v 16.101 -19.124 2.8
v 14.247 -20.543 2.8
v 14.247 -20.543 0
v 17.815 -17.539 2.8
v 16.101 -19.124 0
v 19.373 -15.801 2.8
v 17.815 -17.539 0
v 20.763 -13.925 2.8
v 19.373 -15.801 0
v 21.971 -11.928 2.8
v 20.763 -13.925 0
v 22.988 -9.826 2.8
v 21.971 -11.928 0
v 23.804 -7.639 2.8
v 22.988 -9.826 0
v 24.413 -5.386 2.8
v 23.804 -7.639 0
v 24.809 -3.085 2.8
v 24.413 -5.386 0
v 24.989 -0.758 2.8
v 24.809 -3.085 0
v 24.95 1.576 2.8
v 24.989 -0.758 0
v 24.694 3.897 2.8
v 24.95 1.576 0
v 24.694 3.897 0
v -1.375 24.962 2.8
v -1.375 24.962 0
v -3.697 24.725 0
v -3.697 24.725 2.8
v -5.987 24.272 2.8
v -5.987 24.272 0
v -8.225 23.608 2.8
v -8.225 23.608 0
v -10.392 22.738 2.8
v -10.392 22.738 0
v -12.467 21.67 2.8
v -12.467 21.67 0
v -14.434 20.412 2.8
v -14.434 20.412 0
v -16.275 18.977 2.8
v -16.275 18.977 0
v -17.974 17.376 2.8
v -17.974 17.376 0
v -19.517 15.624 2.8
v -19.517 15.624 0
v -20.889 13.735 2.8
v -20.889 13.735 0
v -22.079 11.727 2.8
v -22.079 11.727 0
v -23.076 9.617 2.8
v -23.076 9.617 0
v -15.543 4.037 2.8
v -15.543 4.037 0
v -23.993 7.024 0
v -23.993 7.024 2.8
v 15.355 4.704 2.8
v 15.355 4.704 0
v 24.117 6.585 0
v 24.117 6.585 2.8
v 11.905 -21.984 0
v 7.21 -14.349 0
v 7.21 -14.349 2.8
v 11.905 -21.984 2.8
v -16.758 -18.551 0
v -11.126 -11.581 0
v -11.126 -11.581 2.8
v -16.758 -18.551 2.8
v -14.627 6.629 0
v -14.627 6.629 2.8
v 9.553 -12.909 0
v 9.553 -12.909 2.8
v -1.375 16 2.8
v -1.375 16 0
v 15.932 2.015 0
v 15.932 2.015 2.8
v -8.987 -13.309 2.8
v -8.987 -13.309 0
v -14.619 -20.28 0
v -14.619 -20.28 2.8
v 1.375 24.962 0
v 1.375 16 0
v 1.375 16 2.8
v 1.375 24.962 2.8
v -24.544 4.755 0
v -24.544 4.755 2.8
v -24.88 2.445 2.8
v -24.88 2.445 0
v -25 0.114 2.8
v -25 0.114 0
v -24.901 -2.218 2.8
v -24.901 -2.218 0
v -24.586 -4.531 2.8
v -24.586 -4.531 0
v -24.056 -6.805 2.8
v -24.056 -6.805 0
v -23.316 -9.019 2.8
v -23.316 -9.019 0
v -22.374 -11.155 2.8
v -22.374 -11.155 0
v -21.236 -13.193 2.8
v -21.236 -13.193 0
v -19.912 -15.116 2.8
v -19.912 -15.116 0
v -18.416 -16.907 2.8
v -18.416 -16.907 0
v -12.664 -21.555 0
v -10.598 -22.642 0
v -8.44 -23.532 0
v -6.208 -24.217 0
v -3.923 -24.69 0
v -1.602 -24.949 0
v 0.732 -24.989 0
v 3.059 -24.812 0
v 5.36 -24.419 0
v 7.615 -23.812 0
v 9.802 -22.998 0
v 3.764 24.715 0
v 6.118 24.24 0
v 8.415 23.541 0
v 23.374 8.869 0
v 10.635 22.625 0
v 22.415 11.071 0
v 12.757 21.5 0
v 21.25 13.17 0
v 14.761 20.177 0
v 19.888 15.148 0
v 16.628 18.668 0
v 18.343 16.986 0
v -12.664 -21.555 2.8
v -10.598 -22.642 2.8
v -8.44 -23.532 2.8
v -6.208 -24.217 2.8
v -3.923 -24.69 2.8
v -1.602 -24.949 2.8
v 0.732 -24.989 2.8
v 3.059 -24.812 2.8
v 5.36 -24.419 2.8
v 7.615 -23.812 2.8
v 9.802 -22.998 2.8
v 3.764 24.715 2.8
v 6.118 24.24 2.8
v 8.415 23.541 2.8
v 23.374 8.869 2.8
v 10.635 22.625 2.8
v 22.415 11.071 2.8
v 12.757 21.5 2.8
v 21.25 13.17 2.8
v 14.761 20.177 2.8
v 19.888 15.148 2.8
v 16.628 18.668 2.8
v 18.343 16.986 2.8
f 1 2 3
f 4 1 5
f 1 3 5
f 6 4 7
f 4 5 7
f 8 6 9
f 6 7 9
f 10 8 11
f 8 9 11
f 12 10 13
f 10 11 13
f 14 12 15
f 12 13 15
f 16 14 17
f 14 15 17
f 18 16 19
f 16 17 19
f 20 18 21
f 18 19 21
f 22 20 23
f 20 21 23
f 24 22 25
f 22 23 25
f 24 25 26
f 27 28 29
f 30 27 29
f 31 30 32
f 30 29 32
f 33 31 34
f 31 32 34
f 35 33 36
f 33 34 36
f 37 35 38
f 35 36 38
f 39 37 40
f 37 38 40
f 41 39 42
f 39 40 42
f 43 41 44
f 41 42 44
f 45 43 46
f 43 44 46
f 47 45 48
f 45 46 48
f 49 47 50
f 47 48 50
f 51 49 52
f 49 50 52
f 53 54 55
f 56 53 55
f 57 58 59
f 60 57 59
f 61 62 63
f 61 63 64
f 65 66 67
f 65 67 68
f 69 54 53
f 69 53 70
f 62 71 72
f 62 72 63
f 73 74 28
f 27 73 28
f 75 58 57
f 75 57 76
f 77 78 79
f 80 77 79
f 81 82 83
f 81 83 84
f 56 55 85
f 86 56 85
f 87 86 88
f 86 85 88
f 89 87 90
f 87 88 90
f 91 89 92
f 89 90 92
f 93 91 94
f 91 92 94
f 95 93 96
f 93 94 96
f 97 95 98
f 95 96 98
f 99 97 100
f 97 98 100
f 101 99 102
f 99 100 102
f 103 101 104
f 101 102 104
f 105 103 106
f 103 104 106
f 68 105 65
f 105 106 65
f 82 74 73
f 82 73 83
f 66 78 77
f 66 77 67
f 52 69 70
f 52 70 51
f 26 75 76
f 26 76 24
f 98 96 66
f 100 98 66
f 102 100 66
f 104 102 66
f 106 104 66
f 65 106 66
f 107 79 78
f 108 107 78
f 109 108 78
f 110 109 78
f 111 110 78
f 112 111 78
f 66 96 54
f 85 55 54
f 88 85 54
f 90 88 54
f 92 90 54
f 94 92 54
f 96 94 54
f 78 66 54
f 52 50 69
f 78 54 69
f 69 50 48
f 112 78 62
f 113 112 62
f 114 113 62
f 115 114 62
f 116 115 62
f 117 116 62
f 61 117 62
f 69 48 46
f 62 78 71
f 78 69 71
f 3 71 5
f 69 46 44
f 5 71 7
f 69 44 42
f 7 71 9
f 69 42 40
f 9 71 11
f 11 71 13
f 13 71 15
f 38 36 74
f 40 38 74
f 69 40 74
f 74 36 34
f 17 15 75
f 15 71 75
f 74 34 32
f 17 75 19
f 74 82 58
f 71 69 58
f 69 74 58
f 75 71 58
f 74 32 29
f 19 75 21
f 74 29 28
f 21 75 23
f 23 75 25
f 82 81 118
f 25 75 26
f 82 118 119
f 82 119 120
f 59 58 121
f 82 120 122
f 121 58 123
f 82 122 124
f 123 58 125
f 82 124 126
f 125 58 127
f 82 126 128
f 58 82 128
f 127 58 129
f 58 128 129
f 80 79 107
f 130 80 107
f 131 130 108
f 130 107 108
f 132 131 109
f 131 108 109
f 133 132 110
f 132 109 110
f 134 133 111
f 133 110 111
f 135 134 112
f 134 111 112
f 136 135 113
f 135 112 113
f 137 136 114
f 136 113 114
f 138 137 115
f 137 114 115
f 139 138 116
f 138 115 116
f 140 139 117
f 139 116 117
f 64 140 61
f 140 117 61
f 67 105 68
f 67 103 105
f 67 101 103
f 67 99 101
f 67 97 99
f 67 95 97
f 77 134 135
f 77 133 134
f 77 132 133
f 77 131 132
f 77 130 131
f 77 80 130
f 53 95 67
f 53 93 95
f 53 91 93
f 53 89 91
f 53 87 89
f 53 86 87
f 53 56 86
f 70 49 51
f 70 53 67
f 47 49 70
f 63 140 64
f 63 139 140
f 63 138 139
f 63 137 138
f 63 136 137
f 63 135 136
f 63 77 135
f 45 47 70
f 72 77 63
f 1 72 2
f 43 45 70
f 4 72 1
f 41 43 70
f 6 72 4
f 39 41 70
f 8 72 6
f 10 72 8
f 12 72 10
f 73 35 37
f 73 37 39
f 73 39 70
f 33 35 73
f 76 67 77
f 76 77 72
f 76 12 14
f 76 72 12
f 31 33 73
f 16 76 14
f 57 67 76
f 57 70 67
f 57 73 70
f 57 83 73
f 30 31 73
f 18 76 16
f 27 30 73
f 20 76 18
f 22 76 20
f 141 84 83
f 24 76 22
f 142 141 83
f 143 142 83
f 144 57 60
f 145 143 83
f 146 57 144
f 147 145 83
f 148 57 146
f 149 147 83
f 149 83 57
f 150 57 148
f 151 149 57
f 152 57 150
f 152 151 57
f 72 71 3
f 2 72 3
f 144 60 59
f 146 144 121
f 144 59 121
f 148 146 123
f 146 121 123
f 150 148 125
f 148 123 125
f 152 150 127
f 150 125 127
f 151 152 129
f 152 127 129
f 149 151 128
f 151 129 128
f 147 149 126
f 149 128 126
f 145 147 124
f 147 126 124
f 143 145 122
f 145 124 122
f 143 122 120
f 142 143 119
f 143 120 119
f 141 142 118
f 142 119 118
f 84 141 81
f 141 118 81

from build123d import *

# Parameters (mm, degrees)
CROQUIS1_R              = 25
SALIENTE_EXTRUIR1_DEPTH = 2.8
CROQUIS2_W              = 2.75
CROQUIS2_H              = 18
CORTAR_EXTRUIR1_DEPTH   = 3.8
MATRIZC2_COUNT          = 5
MATRIZC2_ANGLE          = 282.12


with BuildPart() as part:
    # Croquis1 → Saliente-Extruir1 (new body)
    with BuildSketch(Plane.XY):
        Circle(CROQUIS1_R)
    extrude(amount=SALIENTE_EXTRUIR1_DEPTH)

    # Croquis2 → Cortar-Extruir1 (cut, through all)
    with BuildSketch(Plane.XY):
        with Locations((0, 25)):
            Rectangle(CROQUIS2_W, CROQUIS2_H)
    cortar_extruir1 = extrude(amount=CORTAR_EXTRUIR1_DEPTH, mode=Mode.SUBTRACT)

    # MatrizC2: Cortar-Extruir1 ×5 about axis
    matrizc2_axis = Axis((0, 0, 0), (0, 0, 1))
    for i in range(1, MATRIZC2_COUNT):
        add(cortar_extruir1.rotate(matrizc2_axis, i * MATRIZC2_ANGLE / (MATRIZC2_COUNT - 1)), mode=Mode.SUBTRACT)


solid = part.part
